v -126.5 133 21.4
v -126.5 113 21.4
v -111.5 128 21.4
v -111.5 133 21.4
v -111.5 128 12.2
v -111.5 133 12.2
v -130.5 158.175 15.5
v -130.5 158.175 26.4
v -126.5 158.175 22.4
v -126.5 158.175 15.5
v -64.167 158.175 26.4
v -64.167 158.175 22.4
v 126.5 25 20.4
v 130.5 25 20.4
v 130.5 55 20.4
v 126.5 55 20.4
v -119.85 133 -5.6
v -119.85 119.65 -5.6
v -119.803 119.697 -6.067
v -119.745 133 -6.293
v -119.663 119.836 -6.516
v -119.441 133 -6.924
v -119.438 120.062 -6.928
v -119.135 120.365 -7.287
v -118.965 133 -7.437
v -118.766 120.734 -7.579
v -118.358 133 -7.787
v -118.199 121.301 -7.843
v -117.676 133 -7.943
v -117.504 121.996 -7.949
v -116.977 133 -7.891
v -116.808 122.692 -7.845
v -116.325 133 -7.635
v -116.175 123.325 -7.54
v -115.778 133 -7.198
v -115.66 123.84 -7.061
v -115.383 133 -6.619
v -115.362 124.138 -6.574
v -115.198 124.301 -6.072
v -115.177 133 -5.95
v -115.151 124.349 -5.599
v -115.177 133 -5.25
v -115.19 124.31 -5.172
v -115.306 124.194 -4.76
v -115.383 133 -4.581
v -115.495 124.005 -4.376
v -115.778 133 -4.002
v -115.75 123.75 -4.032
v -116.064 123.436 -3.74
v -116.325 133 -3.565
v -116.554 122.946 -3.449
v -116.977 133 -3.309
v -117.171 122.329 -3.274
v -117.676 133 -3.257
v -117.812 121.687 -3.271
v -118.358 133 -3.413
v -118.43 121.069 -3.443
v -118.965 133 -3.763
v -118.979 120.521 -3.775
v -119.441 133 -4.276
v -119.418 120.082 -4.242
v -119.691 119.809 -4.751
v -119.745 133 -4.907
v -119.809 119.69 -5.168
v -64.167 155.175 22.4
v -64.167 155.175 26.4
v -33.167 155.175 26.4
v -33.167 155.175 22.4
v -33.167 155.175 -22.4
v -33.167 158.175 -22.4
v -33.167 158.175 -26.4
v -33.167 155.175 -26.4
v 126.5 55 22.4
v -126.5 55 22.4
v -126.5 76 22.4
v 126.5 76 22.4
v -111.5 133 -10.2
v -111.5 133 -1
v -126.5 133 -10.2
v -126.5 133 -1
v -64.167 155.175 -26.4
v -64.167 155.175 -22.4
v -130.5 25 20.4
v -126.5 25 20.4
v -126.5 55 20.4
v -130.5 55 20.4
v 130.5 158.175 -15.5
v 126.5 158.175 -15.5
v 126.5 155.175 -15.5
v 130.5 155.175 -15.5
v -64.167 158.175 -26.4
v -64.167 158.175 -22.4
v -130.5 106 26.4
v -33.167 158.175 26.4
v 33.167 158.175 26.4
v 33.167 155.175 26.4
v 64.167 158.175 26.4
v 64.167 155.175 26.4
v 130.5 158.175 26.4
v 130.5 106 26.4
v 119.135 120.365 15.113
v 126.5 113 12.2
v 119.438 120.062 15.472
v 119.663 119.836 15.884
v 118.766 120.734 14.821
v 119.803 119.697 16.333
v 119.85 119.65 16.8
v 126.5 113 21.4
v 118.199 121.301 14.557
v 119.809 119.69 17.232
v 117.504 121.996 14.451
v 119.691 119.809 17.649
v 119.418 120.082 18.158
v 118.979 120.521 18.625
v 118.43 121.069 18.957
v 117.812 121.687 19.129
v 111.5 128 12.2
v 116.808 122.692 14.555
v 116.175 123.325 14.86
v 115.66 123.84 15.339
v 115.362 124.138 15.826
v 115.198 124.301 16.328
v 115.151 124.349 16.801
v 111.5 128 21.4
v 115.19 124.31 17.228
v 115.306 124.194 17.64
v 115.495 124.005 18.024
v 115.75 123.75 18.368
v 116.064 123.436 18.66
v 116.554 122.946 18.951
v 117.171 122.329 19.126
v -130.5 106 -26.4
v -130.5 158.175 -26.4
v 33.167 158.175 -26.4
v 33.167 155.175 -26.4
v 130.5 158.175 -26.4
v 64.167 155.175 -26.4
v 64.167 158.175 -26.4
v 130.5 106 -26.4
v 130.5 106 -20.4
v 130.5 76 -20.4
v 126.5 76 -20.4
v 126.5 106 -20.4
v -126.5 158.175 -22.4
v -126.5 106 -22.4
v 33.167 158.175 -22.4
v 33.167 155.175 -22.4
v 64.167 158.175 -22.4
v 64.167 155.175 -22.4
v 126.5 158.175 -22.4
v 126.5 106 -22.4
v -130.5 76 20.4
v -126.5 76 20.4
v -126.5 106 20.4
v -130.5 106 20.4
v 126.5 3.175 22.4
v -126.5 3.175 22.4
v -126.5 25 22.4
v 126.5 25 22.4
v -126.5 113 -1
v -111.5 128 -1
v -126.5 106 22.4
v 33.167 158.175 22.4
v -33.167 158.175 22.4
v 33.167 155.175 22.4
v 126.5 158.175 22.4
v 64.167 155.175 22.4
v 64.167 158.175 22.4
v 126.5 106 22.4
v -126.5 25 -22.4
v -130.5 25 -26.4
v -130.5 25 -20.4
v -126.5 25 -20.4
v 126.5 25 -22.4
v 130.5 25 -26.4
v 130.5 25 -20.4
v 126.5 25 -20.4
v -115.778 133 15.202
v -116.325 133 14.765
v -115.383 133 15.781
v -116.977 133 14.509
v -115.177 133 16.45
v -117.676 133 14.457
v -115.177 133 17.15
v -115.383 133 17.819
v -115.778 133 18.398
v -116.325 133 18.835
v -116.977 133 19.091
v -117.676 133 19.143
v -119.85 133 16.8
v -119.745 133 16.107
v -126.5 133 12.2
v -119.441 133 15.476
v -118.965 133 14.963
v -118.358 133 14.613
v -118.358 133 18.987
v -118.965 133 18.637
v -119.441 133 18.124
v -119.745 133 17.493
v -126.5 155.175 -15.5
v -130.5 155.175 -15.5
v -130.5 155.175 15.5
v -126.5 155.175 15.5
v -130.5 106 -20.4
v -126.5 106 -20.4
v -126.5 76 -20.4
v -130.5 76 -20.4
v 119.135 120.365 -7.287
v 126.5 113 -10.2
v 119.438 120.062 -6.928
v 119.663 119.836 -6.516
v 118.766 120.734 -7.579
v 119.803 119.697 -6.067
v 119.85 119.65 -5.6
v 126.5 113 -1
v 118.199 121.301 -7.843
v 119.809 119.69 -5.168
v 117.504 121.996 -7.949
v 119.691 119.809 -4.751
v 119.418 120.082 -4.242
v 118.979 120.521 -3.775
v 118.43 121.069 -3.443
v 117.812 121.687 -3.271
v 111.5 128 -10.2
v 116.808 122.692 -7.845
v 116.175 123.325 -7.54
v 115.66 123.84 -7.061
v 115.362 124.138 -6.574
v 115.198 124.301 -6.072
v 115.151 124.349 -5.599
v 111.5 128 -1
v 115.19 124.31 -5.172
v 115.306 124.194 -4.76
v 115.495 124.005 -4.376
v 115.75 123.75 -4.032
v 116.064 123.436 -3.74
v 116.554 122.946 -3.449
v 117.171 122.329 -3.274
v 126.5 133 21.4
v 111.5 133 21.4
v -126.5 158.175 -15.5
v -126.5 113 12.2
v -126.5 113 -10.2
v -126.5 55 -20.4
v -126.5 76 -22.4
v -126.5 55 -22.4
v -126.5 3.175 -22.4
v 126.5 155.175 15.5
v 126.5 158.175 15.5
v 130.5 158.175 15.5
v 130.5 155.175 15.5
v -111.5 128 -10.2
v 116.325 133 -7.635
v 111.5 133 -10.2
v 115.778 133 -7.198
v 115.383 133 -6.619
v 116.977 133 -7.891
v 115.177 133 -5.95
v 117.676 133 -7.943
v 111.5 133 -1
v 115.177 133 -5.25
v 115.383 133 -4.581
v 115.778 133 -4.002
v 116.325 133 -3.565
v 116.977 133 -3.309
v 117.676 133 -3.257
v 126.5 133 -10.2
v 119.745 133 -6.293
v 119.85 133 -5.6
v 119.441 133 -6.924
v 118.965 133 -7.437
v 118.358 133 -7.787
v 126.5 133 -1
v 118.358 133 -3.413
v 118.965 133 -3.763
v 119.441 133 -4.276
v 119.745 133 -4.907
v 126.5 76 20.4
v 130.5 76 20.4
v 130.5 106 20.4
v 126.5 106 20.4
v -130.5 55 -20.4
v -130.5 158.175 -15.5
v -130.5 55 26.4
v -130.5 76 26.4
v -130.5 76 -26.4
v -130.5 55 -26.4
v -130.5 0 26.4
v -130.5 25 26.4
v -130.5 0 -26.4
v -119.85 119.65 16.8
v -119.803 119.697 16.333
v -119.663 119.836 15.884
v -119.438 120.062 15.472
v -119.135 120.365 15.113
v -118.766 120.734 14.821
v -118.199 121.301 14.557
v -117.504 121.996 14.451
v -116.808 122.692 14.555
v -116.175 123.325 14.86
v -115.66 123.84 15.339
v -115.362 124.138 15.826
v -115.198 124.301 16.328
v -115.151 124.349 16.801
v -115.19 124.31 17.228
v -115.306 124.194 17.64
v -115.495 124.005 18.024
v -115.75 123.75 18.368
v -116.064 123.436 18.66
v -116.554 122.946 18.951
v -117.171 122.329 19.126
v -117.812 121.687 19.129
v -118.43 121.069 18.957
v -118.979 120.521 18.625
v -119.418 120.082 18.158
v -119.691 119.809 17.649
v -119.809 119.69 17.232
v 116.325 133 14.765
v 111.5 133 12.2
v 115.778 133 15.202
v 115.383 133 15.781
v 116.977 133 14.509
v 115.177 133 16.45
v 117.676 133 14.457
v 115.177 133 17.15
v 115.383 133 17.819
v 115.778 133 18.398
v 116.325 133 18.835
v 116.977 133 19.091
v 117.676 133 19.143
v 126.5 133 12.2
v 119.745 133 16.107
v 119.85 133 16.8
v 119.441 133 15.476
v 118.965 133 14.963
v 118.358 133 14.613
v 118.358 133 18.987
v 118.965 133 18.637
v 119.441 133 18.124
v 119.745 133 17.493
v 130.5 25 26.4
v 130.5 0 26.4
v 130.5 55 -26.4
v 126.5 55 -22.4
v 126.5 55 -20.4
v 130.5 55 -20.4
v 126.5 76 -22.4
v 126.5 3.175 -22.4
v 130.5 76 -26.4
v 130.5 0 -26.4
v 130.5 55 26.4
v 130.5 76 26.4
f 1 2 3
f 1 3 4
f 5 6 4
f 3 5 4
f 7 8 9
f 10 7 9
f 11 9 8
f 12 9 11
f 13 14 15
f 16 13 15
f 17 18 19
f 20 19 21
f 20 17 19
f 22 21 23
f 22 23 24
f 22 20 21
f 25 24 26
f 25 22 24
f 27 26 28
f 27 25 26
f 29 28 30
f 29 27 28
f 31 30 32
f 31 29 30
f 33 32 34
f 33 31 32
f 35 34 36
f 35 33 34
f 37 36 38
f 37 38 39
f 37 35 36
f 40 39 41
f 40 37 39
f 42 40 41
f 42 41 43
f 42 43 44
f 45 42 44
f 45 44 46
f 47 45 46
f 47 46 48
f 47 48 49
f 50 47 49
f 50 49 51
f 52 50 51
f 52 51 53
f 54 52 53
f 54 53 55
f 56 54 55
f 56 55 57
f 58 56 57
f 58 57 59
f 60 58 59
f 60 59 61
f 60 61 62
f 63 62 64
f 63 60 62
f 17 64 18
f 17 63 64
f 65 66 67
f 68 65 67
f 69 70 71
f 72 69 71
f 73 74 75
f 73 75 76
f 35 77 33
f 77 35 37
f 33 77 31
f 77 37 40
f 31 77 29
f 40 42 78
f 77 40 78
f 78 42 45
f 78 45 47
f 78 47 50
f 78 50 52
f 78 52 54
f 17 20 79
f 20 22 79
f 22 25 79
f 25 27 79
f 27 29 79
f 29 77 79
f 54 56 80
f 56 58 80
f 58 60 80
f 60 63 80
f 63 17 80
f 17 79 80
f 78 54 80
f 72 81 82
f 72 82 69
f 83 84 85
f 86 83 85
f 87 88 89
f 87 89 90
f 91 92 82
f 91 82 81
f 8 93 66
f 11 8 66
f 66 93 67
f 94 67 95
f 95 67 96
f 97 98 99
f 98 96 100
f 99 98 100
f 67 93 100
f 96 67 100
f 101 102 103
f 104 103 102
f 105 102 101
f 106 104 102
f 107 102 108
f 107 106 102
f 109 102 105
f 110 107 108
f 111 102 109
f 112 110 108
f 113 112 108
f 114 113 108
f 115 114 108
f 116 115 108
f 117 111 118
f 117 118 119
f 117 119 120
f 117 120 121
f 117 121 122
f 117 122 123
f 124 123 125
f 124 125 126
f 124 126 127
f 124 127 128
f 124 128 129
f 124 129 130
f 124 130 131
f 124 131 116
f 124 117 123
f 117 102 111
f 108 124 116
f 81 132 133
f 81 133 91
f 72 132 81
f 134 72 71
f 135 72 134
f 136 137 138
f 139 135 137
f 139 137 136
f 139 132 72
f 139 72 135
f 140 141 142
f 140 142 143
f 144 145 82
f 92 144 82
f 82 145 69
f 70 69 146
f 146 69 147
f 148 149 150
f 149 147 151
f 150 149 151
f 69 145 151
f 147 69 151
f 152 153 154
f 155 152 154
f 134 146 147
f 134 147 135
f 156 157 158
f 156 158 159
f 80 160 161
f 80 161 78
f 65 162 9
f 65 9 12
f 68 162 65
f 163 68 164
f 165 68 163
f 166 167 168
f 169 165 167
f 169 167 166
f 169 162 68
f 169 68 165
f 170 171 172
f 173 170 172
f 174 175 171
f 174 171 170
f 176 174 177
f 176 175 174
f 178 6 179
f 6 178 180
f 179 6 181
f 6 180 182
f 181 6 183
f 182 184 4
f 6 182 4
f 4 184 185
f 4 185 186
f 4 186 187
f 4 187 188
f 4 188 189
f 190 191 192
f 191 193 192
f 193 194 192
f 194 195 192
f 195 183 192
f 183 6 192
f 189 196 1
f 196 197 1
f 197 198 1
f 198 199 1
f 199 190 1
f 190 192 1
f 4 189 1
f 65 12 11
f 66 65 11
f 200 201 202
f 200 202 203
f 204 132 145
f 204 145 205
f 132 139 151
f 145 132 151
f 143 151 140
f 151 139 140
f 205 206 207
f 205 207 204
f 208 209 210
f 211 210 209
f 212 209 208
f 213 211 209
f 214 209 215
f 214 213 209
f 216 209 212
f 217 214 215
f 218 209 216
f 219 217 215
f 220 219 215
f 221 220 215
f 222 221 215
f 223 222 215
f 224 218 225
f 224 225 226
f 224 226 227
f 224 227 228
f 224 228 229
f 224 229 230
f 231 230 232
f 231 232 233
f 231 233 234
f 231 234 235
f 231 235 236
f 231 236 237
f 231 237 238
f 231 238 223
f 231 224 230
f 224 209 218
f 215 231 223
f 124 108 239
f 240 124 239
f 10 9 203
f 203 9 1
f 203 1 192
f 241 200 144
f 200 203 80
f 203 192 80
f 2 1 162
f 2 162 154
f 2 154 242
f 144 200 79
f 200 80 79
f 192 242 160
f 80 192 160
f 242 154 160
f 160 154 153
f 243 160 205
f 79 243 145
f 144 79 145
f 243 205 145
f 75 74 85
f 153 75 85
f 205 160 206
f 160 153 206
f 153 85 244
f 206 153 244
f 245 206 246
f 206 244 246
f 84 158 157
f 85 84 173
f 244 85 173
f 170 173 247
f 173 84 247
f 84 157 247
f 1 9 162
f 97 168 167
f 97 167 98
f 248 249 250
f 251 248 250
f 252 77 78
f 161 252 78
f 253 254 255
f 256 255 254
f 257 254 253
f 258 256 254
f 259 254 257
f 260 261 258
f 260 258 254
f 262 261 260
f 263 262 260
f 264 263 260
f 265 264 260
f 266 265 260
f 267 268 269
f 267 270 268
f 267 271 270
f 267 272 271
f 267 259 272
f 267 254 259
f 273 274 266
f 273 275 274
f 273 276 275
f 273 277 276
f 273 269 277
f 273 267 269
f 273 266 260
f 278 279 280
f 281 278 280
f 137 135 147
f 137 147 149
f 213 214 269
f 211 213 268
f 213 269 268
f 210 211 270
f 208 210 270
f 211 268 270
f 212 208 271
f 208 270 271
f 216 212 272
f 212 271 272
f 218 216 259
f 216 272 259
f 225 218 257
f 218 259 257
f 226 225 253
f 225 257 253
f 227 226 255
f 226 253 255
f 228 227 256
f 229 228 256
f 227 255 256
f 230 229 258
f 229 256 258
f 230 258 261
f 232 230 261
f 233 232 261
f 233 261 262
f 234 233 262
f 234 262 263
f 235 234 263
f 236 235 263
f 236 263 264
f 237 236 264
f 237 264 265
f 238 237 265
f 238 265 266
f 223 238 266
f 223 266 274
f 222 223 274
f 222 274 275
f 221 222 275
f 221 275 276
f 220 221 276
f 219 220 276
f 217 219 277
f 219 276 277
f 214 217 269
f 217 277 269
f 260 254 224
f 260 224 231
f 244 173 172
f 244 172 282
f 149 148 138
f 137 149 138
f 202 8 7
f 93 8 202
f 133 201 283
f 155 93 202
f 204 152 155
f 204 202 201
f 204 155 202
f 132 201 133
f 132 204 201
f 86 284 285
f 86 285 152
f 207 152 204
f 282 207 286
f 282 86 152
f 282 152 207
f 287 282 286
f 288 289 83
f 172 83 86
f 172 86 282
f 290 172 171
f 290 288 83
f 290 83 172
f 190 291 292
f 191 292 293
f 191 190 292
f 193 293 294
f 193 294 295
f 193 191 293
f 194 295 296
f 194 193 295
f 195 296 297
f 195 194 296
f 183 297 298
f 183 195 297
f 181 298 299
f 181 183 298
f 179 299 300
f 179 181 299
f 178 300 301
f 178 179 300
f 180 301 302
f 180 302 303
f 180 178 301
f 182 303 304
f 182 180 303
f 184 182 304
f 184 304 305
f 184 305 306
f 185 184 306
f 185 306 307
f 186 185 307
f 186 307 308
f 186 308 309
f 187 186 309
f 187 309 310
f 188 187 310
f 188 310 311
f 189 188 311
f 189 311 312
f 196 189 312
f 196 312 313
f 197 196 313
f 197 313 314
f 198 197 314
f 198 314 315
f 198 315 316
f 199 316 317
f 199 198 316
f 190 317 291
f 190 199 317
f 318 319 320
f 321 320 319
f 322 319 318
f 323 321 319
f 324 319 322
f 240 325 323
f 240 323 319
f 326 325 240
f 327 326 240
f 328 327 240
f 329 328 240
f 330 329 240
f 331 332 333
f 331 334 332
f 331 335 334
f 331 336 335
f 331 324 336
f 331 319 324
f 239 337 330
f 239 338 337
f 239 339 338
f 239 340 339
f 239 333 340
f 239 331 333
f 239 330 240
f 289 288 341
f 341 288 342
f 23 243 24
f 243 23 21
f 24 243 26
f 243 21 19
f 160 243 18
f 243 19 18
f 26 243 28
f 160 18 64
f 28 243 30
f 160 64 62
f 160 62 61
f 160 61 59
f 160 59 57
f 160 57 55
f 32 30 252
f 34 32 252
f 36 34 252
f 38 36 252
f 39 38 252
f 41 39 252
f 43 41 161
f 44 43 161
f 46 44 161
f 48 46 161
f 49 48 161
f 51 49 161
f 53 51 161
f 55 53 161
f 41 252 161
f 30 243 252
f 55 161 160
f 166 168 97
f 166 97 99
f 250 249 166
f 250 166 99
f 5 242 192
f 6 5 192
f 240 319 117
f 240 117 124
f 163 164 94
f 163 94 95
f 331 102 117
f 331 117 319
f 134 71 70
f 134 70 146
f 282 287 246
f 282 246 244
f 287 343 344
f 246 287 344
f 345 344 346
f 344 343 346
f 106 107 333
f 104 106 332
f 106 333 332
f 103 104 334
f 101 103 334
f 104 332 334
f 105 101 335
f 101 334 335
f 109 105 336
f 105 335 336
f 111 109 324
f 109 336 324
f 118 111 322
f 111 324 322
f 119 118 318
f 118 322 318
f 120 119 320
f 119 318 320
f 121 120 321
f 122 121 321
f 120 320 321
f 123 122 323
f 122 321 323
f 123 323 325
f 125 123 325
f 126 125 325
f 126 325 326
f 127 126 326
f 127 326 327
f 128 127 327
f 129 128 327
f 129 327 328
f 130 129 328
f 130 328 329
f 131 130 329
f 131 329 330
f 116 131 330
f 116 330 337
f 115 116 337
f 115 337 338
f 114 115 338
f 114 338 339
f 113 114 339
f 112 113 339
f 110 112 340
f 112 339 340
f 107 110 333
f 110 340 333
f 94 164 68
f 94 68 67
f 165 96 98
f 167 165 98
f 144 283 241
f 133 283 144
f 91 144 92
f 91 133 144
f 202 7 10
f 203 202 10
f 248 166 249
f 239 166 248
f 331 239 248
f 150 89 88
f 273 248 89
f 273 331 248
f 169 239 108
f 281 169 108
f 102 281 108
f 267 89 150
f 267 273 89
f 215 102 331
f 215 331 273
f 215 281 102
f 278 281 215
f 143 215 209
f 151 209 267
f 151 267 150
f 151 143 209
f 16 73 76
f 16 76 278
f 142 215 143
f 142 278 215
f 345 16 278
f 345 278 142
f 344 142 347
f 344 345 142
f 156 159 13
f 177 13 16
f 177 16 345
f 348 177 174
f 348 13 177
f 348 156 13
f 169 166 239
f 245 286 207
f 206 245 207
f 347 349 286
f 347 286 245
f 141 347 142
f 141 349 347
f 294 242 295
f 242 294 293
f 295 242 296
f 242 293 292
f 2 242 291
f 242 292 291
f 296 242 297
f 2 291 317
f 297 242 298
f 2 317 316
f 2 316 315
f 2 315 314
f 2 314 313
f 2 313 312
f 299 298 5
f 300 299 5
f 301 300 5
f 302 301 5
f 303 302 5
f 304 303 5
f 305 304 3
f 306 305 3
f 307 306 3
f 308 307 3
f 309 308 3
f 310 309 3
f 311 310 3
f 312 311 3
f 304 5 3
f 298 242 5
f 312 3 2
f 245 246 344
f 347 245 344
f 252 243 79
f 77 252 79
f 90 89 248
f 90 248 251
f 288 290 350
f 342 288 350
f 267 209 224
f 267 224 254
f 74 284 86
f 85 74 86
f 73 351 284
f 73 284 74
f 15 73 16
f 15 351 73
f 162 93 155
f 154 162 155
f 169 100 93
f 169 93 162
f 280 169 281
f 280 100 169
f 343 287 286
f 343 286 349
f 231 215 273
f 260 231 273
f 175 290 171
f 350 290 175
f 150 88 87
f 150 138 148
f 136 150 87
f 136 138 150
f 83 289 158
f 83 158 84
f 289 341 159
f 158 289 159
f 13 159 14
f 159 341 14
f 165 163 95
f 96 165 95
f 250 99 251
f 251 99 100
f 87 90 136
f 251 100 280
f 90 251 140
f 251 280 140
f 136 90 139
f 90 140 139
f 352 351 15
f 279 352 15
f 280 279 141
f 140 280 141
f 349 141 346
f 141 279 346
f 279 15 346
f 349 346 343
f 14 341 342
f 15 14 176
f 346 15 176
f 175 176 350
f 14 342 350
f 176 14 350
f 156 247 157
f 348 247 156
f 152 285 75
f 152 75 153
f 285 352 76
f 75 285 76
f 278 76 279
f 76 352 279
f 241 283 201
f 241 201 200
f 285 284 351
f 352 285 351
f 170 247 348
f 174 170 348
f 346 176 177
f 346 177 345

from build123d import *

# Parameters (mm, degrees)
SKETCH1_W                        = 261
SKETCH1_H                        = 52.8
BOSS_EXTRUDE1_DEPTH              = 3.175
SKETCH2_W                        = 261
SKETCH2_H                        = 52.8
SKETCH2_W_2                      = 253
SKETCH2_H_2                      = 44.8
BOSS_EXTRUDE2_DEPTH              = 155
SKETCH3_W                        = 6
SKETCH3_H                        = 30
CUT_EXTRUDE1_DEPTH               = 307.328729676
SKETCH4_W                        = 9.2
SKETCH4_H                        = 20
BOSS_EXTRUDE3_DEPTH              = 15
CHAMFER2_SIZE                    = 15
F_13_0_185_DIAMETER_HOLE1_REACH  = 190.192
F_13_0_185_DIAMETER_HOLE1_BORE_R = 2.3495
LPATTERN1_COUNT                  = 2
LPATTERN1_PITCH                  = 22.4
SKETCH7_W                        = 4
SKETCH7_H                        = 15.5
SKETCH7_W_2                      = 31
SKETCH7_H_2                      = 4
CUT_EXTRUDE2_DEPTH               = 3


# Read off the part's stored shape, not the designer's step: Mirror2
with BuildPart() as part:
    # Sketch1 → Boss-Extrude1 (new body)
    with BuildSketch(Plane(origin=(0, 0, 0), x_dir=(1, 0, 0), z_dir=(0, 1, 0))):
        Rectangle(SKETCH1_W, SKETCH1_H)
    extrude(amount=BOSS_EXTRUDE1_DEPTH)

    # Sketch2 → Boss-Extrude2 (add)
    with BuildSketch(Plane(origin=(0, 3.175, 0), x_dir=(1, 0, 0), z_dir=(0, 1, 0))):
        Rectangle(SKETCH2_W, SKETCH2_H)
        Rectangle(SKETCH2_W_2, SKETCH2_H_2, mode=Mode.SUBTRACT)
    extrude(amount=BOSS_EXTRUDE2_DEPTH)

    # Sketch3 → Cut-Extrude1 (cut, through all)
    with BuildSketch(Plane(origin=(130.5, 0, 0), x_dir=(0, 0, -1), z_dir=(1, 0, 0))):
        with Locations((-23.4, 91)):
            Rectangle(SKETCH3_W, SKETCH3_H)
        with Locations((-23.4, 40)):
            Rectangle(SKETCH3_W, SKETCH3_H)
    cut_extrude1 = extrude(amount=-CUT_EXTRUDE1_DEPTH, mode=Mode.SUBTRACT)

    # Mirror1: Cut-Extrude1 across plane
    add(cut_extrude1.mirror(Plane.XY), mode=Mode.SUBTRACT)

    # Sketch4 → Boss-Extrude3 (add)
    with BuildSketch(Plane.ZY.offset(-126.5)):
        with Locations((-5.6, 123)):
            Rectangle(SKETCH4_W, SKETCH4_H)
        with Locations((16.8, 123)):
            Rectangle(SKETCH4_W, SKETCH4_H)
    extrude(amount=BOSS_EXTRUDE3_DEPTH)

    # Chamfer2
    chamfer2_edges = [part.edges().sort_by_distance(p)[0] for p in [
        (111.5, 113, 16.8),
        (111.5, 113, -5.6),
    ]]
    chamfer(chamfer2_edges, length=CHAMFER2_SIZE - 0.0001)  # a hair under: the kernel refuses the full size

    # #13 (0.185) Diameter Hole1 bore → #13 (0.185) Diameter Hole1 (cut, up to next)
    with BuildSketch(Plane(origin=(0, 133, 0), x_dir=(1, 0, 0), z_dir=(0, 1, 0)), mode=Mode.PRIVATE) as f_13_0_185_diameter_hole1_sk1:
        with Locations((117.5, -16.8)):
            Circle(F_13_0_185_DIAMETER_HOLE1_BORE_R)
    f_13_0_185_diameter_hole1_tool1 = extrude(f_13_0_185_diameter_hole1_sk1.sketch, amount=-F_13_0_185_DIAMETER_HOLE1_REACH, mode=Mode.PRIVATE) & part.part
    f_13_0_185_diameter_hole1 = f_13_0_185_diameter_hole1_tool1.solids().sort_by_distance((117.5, 133, 16.8))[0]
    add(f_13_0_185_diameter_hole1, mode=Mode.SUBTRACT)

    # LPattern1: #13 (0.185) Diameter Hole1 ×2
    with Locations(*[(0, 0, -i * LPATTERN1_PITCH) for i in range(1, LPATTERN1_COUNT)]):
        add(f_13_0_185_diameter_hole1, mode=Mode.SUBTRACT)

    # Mirror2: part across plane


with BuildPart() as part_1:
    add(part.part)
    add(part.part.mirror(Plane(origin=(0, 0, 0), x_dir=(0, 0, 1), z_dir=(1, 0, 0))))

    # Sketch7 → Cut-Extrude2 (cut)
    with BuildSketch(Plane(origin=(0, 158.175, 0), x_dir=(1, 0, 0), z_dir=(0, 1, 0))):
        with Locations((128.5, 7.75)):
            Rectangle(SKETCH7_W, SKETCH7_H)
        with Locations((48.666666667, 24.4)):
            Rectangle(SKETCH7_W_2, SKETCH7_H_2)
        with Locations((-128.5, 7.75)):
            Rectangle(SKETCH7_W, SKETCH7_H)
        with Locations((-48.666666667, 24.4)):
            Rectangle(SKETCH7_W_2, SKETCH7_H_2)
    cut_extrude2 = extrude(amount=-CUT_EXTRUDE2_DEPTH, mode=Mode.SUBTRACT)

    # Mirror3: Cut-Extrude2 across plane
    add(cut_extrude2.mirror(Plane.XY), mode=Mode.SUBTRACT)


solid = part_1.part
